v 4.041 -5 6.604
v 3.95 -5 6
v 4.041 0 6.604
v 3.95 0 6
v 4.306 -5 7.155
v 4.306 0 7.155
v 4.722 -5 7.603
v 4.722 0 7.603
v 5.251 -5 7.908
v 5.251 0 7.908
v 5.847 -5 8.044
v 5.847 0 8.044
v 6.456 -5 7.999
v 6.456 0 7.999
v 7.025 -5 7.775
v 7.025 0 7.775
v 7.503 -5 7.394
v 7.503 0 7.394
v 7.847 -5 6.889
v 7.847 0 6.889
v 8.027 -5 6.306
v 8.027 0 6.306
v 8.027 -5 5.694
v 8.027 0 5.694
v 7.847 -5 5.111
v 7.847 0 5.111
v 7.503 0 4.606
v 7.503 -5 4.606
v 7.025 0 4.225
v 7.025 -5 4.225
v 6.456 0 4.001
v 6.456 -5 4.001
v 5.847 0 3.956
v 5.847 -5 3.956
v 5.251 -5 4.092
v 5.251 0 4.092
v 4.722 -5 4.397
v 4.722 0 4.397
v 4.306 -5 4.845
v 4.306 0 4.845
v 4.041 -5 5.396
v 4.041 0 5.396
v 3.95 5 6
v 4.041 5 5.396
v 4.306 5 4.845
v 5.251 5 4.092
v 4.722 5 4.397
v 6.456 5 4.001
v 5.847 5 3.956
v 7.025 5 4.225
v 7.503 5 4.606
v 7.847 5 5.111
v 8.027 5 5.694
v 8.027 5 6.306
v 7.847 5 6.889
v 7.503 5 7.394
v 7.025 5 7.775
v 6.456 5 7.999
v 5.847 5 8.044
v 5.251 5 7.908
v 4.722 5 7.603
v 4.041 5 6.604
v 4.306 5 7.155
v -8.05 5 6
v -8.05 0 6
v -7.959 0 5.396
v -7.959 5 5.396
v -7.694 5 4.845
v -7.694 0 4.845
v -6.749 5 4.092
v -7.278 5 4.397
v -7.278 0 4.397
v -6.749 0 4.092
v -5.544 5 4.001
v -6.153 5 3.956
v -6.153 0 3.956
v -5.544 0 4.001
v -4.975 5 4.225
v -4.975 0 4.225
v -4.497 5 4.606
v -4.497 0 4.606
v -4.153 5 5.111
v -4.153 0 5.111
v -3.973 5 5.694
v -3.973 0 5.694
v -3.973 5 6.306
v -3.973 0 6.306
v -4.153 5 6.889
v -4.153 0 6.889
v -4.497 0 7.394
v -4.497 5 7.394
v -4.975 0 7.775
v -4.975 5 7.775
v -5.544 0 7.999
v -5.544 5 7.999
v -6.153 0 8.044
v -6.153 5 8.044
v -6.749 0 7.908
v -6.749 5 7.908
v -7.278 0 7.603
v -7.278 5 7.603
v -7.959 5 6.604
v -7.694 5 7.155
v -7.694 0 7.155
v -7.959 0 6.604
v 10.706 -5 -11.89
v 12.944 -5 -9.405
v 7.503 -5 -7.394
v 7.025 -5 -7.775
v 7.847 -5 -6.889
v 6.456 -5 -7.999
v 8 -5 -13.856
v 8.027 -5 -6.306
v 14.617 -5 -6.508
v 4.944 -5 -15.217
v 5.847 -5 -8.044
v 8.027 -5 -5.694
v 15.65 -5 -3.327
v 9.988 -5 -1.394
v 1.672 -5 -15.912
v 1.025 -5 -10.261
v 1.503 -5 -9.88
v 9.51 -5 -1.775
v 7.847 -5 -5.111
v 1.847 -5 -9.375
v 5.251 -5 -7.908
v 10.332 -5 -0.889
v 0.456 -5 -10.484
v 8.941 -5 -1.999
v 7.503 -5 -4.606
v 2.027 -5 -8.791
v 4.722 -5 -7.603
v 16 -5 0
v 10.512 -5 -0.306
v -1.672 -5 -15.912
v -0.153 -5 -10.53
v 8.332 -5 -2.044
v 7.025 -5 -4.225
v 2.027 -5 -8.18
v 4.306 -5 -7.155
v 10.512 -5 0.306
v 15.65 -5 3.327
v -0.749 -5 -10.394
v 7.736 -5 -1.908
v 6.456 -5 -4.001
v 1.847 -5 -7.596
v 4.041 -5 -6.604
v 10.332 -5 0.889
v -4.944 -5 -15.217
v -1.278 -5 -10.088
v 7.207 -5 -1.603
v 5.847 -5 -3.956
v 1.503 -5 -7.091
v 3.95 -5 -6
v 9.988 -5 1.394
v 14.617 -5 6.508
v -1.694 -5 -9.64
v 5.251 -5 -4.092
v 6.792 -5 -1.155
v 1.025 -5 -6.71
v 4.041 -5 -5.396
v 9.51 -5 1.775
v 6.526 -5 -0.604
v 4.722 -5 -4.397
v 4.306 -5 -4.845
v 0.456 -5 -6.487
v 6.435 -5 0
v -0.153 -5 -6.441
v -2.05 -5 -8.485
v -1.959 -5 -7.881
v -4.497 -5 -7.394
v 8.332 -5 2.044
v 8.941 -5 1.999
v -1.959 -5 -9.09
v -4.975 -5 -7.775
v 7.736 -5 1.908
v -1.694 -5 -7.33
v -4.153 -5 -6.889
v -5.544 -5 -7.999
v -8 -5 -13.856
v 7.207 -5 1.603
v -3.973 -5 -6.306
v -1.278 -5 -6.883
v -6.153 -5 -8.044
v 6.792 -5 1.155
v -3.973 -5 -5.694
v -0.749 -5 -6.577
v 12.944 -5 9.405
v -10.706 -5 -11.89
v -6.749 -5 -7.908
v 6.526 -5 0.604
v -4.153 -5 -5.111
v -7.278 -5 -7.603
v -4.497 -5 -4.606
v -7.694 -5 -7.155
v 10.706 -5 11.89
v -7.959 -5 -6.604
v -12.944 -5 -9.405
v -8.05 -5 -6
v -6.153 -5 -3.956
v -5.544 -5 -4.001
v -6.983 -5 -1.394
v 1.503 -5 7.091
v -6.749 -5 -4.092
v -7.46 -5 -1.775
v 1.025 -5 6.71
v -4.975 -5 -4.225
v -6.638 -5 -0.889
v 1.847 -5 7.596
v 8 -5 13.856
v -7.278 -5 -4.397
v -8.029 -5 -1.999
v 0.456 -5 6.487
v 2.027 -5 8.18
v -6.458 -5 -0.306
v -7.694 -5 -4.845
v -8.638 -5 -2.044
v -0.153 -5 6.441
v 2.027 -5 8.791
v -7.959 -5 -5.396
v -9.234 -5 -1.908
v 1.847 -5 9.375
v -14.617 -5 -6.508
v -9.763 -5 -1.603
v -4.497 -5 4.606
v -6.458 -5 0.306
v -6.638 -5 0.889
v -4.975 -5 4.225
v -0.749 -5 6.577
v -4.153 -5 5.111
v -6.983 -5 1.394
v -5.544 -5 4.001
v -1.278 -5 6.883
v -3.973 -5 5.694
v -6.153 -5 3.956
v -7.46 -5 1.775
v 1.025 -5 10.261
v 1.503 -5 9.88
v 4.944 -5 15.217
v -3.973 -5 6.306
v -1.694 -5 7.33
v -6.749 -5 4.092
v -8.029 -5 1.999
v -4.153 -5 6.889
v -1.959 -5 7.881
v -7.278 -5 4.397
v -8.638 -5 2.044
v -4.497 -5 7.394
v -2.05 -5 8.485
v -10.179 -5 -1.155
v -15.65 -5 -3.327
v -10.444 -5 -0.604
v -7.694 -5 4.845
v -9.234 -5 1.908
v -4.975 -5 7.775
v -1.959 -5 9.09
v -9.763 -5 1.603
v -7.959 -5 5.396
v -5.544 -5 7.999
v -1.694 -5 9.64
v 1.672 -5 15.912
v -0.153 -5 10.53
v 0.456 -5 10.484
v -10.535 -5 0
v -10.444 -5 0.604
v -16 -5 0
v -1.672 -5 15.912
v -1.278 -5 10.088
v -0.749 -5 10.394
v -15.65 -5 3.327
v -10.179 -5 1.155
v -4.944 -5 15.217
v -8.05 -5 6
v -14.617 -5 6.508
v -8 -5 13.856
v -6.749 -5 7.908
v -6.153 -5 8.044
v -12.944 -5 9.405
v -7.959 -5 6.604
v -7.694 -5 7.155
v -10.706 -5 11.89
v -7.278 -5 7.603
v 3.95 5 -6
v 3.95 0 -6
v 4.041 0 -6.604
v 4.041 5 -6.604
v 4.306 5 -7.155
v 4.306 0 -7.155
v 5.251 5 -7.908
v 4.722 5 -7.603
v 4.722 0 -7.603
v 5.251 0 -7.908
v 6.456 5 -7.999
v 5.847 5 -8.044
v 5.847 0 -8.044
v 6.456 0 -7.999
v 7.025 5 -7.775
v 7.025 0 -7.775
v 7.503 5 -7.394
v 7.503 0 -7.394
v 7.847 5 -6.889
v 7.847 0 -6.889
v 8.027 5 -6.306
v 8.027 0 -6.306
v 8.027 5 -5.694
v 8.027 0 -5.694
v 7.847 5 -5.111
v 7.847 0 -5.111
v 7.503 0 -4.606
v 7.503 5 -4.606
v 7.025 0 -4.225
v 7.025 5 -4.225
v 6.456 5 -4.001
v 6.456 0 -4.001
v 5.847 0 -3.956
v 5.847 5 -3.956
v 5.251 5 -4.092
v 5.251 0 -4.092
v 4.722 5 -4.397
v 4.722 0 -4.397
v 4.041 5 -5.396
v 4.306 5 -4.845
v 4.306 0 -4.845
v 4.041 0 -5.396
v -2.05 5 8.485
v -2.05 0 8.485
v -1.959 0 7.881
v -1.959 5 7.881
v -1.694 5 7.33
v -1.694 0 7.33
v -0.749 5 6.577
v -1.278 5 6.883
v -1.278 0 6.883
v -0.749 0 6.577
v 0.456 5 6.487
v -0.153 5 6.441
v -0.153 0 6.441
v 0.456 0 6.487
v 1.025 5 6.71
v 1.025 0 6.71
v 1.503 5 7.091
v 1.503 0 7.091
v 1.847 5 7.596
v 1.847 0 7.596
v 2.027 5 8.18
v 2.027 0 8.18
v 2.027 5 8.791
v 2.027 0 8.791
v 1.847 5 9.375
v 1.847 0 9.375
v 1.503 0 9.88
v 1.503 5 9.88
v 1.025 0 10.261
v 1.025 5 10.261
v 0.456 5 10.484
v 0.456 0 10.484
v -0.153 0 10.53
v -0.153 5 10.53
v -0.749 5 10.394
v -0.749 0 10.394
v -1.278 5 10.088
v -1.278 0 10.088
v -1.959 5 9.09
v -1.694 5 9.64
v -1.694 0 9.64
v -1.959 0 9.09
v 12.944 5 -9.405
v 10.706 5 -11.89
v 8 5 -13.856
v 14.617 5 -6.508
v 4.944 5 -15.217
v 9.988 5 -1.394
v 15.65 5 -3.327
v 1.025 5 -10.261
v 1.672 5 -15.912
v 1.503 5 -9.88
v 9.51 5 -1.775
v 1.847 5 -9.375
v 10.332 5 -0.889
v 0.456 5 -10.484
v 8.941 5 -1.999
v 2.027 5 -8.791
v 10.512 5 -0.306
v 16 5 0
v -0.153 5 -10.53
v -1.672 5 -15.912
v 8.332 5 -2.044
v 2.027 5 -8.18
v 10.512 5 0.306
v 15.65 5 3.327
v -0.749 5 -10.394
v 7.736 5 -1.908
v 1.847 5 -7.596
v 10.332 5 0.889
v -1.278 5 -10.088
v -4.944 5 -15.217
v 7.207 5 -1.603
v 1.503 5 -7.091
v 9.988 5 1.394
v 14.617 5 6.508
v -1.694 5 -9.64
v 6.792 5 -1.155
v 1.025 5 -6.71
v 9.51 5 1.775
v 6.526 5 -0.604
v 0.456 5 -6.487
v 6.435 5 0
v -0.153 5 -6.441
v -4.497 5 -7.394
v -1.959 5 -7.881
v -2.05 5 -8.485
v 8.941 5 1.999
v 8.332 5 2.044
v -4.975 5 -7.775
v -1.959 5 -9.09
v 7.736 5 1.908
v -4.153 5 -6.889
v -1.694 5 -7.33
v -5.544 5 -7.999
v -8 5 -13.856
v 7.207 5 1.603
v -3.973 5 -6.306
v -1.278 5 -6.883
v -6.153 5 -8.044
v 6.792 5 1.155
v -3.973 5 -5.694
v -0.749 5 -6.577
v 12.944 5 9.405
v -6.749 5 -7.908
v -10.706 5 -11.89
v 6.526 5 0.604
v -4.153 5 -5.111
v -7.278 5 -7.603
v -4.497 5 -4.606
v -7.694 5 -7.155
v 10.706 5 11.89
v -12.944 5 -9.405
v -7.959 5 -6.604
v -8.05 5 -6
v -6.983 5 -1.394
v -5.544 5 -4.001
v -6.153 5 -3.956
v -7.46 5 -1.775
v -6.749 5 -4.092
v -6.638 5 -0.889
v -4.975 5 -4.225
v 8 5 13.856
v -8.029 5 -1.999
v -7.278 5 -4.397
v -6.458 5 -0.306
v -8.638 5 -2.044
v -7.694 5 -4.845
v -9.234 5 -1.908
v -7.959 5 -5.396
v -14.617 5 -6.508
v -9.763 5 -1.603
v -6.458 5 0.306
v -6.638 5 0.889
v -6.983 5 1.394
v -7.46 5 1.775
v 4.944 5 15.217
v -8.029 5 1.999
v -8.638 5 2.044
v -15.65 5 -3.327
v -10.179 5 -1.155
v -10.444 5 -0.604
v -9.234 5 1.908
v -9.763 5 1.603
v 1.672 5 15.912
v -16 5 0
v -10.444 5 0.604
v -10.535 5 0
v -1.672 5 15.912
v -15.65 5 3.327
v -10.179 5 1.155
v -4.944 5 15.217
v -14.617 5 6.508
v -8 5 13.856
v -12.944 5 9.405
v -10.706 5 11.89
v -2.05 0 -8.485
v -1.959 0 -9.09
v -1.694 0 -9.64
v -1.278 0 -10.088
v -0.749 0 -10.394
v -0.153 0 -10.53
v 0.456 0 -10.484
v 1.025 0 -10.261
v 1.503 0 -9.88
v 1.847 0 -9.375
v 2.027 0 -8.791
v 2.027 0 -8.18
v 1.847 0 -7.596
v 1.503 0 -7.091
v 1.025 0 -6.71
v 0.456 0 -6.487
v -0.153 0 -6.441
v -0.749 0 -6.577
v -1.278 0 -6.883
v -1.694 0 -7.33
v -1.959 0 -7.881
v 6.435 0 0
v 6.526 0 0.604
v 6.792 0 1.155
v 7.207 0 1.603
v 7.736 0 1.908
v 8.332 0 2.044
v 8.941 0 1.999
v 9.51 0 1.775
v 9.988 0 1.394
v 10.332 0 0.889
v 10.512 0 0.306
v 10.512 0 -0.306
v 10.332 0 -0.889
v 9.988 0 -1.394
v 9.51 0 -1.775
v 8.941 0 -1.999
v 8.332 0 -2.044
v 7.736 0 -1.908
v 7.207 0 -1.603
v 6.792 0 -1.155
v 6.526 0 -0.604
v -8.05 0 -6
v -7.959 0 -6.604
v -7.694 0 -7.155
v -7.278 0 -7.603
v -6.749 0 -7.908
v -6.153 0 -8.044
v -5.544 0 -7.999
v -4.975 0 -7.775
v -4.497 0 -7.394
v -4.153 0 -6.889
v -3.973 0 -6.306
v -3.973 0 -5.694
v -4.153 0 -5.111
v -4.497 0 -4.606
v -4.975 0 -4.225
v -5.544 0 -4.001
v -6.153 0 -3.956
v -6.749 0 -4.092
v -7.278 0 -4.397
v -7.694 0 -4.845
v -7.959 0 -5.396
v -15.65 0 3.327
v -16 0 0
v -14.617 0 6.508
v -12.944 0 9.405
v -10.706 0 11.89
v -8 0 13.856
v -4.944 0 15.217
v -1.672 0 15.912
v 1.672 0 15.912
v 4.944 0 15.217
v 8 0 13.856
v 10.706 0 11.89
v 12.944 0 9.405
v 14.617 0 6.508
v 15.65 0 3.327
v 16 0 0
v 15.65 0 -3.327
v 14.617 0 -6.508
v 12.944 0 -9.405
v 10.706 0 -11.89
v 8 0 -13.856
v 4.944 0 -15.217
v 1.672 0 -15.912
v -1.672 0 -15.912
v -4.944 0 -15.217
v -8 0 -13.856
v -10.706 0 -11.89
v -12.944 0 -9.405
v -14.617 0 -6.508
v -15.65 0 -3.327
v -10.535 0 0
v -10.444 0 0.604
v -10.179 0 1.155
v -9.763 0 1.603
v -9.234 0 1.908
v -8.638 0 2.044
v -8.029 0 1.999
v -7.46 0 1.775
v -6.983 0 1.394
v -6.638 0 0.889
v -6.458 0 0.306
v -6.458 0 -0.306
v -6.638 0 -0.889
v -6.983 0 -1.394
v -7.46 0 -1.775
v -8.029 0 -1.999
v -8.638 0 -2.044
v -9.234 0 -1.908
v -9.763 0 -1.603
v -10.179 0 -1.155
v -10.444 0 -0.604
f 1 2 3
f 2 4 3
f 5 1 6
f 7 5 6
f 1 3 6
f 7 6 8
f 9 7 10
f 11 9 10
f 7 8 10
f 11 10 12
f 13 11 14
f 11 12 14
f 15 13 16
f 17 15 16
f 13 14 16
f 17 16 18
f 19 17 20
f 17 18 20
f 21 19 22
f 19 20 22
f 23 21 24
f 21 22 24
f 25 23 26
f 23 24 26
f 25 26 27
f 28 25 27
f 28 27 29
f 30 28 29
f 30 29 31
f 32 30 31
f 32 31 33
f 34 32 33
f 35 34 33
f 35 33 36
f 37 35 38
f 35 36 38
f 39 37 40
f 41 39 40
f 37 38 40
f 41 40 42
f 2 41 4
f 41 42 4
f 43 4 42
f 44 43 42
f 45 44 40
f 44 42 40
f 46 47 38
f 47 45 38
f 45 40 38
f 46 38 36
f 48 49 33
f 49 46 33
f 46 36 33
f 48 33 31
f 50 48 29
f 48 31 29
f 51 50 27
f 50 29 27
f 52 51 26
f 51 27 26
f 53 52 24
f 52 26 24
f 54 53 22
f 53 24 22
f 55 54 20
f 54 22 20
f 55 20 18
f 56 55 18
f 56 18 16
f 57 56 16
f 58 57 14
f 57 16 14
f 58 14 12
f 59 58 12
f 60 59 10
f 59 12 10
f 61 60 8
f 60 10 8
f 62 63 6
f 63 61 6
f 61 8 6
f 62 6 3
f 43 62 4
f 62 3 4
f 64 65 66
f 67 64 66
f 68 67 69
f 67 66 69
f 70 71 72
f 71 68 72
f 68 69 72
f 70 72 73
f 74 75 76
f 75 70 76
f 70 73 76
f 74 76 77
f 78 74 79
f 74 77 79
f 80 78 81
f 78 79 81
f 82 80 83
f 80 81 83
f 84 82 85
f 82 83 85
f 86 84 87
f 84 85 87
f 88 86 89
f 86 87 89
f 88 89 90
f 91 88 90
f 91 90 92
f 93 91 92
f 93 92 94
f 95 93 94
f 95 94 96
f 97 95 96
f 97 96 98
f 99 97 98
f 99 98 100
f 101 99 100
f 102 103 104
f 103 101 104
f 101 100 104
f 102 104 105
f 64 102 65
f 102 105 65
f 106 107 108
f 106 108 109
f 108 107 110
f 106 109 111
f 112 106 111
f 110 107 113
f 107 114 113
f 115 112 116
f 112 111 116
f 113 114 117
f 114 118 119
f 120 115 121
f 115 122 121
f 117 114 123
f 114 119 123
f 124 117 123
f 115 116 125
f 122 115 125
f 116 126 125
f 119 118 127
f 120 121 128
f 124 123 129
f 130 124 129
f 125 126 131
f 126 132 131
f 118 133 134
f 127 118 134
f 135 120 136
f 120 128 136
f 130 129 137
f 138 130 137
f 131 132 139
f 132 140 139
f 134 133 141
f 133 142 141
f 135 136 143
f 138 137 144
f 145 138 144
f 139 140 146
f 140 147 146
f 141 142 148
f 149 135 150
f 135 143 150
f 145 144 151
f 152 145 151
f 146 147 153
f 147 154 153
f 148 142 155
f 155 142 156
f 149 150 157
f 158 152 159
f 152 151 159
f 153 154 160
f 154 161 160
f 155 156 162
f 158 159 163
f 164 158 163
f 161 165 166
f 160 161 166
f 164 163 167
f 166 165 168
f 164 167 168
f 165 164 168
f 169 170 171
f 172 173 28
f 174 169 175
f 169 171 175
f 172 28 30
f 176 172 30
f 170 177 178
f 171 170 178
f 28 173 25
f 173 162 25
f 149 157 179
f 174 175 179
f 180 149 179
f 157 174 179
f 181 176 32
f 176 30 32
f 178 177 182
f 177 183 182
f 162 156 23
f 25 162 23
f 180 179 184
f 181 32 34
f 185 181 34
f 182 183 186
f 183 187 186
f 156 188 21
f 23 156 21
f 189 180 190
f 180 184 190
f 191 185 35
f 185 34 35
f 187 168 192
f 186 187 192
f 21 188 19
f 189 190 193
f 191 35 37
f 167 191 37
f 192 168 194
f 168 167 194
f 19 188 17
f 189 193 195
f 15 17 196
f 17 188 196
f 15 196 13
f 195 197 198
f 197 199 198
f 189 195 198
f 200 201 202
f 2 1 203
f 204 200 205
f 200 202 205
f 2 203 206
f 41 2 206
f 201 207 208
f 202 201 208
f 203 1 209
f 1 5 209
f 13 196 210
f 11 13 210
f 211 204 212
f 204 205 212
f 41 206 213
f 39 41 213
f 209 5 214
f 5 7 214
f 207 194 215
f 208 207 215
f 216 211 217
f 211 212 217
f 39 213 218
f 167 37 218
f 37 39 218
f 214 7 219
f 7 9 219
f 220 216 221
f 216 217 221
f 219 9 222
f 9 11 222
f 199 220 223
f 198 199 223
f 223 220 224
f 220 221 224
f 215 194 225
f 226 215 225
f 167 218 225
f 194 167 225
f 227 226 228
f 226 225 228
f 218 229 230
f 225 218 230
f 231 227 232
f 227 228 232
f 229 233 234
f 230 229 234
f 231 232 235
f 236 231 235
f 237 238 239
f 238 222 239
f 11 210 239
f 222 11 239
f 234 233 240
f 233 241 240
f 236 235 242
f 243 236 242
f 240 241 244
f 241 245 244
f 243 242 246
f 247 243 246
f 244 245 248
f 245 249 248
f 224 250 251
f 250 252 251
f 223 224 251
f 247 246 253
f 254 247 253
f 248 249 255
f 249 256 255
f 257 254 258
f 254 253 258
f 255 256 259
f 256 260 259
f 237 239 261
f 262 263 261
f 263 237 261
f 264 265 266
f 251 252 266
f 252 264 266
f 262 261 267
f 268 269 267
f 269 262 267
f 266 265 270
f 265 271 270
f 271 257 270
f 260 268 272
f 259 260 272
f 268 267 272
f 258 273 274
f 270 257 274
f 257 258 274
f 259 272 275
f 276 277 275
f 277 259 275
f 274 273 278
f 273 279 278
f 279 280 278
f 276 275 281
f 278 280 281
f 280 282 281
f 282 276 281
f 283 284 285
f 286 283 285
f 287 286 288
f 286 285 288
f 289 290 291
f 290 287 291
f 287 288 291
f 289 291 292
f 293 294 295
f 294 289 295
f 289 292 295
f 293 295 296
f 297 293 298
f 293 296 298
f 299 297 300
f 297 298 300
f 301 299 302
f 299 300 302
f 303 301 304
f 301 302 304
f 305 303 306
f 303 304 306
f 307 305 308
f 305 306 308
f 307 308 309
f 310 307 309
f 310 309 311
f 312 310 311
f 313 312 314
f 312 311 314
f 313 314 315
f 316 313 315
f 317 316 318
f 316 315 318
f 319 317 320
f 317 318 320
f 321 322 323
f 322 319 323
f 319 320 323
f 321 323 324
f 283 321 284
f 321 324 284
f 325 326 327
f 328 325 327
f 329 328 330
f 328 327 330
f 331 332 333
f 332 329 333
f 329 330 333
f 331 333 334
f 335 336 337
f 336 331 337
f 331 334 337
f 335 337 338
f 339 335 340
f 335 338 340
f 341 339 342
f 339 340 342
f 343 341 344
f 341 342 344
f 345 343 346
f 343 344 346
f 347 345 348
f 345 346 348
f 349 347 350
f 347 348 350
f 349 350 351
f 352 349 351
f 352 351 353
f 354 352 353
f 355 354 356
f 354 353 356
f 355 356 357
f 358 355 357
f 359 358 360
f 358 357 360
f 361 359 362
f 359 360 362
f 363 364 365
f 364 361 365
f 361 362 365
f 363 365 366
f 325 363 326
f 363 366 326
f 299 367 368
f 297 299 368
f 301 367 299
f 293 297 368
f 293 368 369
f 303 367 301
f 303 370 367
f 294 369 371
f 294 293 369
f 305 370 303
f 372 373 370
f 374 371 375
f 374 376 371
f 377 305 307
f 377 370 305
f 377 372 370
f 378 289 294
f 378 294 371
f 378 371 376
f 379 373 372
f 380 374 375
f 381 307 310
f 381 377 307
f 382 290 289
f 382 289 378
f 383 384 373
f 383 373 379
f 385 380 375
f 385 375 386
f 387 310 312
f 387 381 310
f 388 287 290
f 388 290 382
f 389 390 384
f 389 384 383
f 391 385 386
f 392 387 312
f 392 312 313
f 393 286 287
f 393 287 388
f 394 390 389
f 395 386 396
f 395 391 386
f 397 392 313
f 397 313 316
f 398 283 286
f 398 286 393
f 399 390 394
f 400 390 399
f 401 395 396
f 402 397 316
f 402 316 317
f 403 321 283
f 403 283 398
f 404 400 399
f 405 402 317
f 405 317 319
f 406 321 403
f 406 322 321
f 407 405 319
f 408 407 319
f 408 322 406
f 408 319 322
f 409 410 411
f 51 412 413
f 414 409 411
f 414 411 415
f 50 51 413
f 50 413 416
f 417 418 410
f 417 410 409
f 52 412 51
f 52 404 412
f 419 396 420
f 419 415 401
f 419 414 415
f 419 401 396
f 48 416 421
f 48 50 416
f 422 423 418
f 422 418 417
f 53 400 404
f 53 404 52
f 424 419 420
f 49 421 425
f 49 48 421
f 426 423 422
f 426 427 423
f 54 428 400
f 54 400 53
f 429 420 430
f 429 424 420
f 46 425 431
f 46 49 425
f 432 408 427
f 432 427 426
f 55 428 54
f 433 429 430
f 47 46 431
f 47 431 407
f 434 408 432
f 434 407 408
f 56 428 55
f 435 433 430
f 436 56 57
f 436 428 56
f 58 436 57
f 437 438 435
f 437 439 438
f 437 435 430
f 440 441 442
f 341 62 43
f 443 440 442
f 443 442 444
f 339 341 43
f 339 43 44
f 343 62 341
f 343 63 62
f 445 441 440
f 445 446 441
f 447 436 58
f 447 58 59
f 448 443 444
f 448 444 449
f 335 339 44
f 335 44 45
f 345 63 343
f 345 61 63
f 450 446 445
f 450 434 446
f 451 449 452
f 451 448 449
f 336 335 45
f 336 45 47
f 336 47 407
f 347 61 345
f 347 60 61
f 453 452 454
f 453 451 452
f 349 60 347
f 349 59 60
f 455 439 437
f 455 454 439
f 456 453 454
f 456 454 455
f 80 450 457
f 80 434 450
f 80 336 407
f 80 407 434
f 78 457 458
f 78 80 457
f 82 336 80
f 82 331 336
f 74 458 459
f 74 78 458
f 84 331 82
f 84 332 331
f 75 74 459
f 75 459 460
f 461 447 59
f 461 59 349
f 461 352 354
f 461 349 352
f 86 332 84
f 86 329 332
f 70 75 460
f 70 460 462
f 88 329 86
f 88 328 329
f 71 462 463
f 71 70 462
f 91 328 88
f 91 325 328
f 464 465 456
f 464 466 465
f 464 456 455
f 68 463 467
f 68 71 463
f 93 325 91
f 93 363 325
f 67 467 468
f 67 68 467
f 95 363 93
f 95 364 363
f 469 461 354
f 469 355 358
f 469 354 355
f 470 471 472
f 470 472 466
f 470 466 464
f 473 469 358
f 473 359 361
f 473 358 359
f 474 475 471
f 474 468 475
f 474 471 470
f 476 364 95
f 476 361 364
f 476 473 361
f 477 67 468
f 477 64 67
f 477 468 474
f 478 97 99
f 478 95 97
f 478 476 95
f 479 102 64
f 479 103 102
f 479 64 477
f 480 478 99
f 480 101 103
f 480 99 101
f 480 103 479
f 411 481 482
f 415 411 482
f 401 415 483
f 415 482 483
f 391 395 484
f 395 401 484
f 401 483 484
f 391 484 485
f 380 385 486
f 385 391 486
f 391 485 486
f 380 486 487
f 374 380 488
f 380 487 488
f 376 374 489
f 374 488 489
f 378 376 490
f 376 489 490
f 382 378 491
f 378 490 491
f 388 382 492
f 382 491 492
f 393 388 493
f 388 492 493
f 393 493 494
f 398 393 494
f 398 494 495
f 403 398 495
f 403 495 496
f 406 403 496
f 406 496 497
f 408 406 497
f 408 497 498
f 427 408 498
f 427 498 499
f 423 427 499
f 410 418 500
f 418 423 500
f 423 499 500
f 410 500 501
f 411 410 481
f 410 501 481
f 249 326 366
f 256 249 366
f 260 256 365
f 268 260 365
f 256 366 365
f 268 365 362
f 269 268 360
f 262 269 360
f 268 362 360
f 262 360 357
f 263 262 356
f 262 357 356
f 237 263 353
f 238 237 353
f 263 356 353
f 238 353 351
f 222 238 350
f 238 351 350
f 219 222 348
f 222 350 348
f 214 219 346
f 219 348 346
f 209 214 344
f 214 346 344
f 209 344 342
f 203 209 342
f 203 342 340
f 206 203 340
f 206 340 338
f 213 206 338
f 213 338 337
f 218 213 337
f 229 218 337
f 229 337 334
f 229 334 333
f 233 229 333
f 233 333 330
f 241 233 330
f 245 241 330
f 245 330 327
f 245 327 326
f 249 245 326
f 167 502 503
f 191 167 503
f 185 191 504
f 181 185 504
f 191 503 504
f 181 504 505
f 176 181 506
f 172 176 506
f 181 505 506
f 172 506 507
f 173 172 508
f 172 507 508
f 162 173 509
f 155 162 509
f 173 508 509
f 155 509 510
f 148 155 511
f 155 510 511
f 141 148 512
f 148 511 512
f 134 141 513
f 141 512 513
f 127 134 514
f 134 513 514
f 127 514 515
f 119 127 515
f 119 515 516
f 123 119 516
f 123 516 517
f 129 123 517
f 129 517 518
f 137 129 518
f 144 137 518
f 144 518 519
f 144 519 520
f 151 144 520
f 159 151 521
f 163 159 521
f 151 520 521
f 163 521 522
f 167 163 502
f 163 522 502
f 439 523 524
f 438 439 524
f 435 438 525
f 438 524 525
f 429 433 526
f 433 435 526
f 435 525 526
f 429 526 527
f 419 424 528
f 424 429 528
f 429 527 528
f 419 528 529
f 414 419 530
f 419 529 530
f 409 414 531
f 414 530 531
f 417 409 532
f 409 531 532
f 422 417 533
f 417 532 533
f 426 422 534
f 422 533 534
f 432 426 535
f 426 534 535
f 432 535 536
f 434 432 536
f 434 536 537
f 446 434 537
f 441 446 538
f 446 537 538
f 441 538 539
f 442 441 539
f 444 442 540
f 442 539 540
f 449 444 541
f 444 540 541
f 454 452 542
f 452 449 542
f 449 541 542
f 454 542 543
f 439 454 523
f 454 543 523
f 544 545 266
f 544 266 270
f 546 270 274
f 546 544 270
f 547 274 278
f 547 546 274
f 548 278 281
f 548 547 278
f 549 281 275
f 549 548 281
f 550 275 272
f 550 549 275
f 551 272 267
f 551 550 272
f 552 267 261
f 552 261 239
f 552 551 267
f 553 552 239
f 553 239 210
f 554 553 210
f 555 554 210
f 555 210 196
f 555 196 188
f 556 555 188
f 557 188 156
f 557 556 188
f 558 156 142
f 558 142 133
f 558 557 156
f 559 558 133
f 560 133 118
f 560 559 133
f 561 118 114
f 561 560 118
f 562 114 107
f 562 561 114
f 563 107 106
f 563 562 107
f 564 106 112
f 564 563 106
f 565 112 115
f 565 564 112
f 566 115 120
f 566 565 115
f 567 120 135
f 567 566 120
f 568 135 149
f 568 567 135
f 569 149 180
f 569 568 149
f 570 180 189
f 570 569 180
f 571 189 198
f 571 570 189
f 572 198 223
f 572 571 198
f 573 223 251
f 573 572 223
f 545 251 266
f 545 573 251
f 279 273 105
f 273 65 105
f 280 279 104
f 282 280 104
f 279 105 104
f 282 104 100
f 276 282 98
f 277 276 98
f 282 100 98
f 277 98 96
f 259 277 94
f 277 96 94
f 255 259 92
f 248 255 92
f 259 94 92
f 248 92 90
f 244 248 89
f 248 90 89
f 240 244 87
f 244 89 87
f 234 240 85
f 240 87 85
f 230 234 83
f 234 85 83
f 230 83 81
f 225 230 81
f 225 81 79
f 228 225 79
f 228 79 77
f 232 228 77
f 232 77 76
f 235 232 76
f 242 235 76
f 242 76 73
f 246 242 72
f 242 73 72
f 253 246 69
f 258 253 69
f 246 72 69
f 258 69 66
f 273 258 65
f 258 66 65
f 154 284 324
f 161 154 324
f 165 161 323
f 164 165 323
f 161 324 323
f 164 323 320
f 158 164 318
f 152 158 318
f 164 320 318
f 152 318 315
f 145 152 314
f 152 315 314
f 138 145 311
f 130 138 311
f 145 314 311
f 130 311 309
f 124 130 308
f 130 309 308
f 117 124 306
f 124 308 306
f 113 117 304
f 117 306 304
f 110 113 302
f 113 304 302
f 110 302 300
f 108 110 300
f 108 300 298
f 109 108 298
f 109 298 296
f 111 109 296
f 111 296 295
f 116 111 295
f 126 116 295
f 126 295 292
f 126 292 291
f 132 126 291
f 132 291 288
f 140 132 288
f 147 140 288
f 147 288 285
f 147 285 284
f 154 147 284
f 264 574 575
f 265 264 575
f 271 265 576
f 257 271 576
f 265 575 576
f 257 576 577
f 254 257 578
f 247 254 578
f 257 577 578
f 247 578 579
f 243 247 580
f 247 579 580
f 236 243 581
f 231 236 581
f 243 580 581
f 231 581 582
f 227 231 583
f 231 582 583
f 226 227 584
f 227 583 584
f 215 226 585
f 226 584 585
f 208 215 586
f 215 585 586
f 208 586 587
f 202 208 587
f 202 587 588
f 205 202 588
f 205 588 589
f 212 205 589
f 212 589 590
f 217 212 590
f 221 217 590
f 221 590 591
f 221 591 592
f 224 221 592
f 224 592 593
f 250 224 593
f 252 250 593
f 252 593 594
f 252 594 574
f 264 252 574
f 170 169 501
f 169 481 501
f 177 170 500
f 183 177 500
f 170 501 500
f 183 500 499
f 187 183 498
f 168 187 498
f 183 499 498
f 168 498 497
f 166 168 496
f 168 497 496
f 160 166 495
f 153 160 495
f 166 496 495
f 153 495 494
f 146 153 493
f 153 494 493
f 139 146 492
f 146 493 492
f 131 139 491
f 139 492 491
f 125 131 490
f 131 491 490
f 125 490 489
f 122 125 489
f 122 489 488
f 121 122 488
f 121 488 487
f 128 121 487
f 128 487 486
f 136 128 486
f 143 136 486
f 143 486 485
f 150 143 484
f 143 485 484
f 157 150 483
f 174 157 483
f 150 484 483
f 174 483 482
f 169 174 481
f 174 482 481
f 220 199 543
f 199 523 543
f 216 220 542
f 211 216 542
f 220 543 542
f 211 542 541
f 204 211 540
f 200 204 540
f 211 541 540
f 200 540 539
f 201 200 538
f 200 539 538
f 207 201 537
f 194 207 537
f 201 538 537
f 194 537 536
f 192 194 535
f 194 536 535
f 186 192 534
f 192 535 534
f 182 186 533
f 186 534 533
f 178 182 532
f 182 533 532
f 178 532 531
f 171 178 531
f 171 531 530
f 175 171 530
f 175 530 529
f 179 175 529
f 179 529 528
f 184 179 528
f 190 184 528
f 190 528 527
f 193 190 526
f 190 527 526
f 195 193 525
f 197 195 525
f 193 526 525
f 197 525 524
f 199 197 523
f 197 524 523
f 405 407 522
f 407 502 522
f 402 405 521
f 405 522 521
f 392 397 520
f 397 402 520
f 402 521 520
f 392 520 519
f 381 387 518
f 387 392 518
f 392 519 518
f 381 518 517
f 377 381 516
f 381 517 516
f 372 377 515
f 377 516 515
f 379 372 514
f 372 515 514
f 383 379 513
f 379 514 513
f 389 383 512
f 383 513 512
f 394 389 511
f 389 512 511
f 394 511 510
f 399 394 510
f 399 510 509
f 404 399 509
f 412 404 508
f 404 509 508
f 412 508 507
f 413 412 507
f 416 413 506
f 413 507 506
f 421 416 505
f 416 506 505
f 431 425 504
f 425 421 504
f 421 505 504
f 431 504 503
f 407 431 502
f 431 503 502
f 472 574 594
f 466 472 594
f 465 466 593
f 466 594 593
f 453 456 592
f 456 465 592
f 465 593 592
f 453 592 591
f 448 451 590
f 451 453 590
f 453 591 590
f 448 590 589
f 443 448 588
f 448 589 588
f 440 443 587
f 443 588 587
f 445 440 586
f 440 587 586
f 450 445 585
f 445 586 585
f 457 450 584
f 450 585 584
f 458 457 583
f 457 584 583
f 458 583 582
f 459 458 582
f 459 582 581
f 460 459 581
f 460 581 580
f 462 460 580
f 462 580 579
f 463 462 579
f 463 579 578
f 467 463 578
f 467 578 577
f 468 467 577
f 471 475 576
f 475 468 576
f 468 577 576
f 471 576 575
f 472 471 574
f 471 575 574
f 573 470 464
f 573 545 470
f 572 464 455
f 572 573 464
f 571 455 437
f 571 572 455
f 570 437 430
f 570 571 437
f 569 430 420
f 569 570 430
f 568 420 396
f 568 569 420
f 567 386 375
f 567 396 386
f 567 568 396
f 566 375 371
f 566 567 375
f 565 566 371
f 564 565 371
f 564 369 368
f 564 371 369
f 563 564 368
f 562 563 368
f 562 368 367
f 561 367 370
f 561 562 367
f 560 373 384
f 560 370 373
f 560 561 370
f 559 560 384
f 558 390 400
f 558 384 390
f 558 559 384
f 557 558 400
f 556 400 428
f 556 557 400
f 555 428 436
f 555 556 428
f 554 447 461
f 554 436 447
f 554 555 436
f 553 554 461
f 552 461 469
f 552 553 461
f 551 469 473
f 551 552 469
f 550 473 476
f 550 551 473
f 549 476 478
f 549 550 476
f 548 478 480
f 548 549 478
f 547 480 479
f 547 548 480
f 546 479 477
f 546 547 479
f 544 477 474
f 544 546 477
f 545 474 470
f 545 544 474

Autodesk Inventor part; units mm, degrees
ref_plane "YZ Plane" through (0, 0, 0) normal (1, 0, 0) x (0, 1, 0)
ref_plane "XZ Plane" through (0, 0, 0) normal (0, 1, 0) x (-1, 0, 0)
ref_plane "XY Plane" through (0, 0, 0) normal (0, 0, 1) x (1, 0, 0)
sketch "Sketch1" plane through (0, 0, 0) normal (0, 1, 0) x (-1, 0, 0)
  circle A0 centre (0, 0) radius 16
  circle A1 centre (0, 0) radius 2.5 construction
  circle A2 centre (6, 6) radius 2.05
  circle A3 centre (0, 8.4853) radius 2.05
  circle A4 centre (-6, 6) radius 2.05
  circle A5 centre (-8.4853, 0) radius 2.05
  circle A6 centre (-6, -6) radius 2.05
  circle A7 centre (0, -8.4853) radius 2.05
  circle A8 centre (6, -6) radius 2.05
  circle A9 centre (8.4853, 0) radius 2.05
  dimension "d0" = 32
  dimension "d1" = 5
  dimension "d2" = 4.1
  dimension "d3" = 6
  dimension "d4" = 6
  dimension "d7" = 360
extrude "Extrusion1" add sketch "Sketch1" along normal mid plane 10
properties part number "PulleySpacer"
